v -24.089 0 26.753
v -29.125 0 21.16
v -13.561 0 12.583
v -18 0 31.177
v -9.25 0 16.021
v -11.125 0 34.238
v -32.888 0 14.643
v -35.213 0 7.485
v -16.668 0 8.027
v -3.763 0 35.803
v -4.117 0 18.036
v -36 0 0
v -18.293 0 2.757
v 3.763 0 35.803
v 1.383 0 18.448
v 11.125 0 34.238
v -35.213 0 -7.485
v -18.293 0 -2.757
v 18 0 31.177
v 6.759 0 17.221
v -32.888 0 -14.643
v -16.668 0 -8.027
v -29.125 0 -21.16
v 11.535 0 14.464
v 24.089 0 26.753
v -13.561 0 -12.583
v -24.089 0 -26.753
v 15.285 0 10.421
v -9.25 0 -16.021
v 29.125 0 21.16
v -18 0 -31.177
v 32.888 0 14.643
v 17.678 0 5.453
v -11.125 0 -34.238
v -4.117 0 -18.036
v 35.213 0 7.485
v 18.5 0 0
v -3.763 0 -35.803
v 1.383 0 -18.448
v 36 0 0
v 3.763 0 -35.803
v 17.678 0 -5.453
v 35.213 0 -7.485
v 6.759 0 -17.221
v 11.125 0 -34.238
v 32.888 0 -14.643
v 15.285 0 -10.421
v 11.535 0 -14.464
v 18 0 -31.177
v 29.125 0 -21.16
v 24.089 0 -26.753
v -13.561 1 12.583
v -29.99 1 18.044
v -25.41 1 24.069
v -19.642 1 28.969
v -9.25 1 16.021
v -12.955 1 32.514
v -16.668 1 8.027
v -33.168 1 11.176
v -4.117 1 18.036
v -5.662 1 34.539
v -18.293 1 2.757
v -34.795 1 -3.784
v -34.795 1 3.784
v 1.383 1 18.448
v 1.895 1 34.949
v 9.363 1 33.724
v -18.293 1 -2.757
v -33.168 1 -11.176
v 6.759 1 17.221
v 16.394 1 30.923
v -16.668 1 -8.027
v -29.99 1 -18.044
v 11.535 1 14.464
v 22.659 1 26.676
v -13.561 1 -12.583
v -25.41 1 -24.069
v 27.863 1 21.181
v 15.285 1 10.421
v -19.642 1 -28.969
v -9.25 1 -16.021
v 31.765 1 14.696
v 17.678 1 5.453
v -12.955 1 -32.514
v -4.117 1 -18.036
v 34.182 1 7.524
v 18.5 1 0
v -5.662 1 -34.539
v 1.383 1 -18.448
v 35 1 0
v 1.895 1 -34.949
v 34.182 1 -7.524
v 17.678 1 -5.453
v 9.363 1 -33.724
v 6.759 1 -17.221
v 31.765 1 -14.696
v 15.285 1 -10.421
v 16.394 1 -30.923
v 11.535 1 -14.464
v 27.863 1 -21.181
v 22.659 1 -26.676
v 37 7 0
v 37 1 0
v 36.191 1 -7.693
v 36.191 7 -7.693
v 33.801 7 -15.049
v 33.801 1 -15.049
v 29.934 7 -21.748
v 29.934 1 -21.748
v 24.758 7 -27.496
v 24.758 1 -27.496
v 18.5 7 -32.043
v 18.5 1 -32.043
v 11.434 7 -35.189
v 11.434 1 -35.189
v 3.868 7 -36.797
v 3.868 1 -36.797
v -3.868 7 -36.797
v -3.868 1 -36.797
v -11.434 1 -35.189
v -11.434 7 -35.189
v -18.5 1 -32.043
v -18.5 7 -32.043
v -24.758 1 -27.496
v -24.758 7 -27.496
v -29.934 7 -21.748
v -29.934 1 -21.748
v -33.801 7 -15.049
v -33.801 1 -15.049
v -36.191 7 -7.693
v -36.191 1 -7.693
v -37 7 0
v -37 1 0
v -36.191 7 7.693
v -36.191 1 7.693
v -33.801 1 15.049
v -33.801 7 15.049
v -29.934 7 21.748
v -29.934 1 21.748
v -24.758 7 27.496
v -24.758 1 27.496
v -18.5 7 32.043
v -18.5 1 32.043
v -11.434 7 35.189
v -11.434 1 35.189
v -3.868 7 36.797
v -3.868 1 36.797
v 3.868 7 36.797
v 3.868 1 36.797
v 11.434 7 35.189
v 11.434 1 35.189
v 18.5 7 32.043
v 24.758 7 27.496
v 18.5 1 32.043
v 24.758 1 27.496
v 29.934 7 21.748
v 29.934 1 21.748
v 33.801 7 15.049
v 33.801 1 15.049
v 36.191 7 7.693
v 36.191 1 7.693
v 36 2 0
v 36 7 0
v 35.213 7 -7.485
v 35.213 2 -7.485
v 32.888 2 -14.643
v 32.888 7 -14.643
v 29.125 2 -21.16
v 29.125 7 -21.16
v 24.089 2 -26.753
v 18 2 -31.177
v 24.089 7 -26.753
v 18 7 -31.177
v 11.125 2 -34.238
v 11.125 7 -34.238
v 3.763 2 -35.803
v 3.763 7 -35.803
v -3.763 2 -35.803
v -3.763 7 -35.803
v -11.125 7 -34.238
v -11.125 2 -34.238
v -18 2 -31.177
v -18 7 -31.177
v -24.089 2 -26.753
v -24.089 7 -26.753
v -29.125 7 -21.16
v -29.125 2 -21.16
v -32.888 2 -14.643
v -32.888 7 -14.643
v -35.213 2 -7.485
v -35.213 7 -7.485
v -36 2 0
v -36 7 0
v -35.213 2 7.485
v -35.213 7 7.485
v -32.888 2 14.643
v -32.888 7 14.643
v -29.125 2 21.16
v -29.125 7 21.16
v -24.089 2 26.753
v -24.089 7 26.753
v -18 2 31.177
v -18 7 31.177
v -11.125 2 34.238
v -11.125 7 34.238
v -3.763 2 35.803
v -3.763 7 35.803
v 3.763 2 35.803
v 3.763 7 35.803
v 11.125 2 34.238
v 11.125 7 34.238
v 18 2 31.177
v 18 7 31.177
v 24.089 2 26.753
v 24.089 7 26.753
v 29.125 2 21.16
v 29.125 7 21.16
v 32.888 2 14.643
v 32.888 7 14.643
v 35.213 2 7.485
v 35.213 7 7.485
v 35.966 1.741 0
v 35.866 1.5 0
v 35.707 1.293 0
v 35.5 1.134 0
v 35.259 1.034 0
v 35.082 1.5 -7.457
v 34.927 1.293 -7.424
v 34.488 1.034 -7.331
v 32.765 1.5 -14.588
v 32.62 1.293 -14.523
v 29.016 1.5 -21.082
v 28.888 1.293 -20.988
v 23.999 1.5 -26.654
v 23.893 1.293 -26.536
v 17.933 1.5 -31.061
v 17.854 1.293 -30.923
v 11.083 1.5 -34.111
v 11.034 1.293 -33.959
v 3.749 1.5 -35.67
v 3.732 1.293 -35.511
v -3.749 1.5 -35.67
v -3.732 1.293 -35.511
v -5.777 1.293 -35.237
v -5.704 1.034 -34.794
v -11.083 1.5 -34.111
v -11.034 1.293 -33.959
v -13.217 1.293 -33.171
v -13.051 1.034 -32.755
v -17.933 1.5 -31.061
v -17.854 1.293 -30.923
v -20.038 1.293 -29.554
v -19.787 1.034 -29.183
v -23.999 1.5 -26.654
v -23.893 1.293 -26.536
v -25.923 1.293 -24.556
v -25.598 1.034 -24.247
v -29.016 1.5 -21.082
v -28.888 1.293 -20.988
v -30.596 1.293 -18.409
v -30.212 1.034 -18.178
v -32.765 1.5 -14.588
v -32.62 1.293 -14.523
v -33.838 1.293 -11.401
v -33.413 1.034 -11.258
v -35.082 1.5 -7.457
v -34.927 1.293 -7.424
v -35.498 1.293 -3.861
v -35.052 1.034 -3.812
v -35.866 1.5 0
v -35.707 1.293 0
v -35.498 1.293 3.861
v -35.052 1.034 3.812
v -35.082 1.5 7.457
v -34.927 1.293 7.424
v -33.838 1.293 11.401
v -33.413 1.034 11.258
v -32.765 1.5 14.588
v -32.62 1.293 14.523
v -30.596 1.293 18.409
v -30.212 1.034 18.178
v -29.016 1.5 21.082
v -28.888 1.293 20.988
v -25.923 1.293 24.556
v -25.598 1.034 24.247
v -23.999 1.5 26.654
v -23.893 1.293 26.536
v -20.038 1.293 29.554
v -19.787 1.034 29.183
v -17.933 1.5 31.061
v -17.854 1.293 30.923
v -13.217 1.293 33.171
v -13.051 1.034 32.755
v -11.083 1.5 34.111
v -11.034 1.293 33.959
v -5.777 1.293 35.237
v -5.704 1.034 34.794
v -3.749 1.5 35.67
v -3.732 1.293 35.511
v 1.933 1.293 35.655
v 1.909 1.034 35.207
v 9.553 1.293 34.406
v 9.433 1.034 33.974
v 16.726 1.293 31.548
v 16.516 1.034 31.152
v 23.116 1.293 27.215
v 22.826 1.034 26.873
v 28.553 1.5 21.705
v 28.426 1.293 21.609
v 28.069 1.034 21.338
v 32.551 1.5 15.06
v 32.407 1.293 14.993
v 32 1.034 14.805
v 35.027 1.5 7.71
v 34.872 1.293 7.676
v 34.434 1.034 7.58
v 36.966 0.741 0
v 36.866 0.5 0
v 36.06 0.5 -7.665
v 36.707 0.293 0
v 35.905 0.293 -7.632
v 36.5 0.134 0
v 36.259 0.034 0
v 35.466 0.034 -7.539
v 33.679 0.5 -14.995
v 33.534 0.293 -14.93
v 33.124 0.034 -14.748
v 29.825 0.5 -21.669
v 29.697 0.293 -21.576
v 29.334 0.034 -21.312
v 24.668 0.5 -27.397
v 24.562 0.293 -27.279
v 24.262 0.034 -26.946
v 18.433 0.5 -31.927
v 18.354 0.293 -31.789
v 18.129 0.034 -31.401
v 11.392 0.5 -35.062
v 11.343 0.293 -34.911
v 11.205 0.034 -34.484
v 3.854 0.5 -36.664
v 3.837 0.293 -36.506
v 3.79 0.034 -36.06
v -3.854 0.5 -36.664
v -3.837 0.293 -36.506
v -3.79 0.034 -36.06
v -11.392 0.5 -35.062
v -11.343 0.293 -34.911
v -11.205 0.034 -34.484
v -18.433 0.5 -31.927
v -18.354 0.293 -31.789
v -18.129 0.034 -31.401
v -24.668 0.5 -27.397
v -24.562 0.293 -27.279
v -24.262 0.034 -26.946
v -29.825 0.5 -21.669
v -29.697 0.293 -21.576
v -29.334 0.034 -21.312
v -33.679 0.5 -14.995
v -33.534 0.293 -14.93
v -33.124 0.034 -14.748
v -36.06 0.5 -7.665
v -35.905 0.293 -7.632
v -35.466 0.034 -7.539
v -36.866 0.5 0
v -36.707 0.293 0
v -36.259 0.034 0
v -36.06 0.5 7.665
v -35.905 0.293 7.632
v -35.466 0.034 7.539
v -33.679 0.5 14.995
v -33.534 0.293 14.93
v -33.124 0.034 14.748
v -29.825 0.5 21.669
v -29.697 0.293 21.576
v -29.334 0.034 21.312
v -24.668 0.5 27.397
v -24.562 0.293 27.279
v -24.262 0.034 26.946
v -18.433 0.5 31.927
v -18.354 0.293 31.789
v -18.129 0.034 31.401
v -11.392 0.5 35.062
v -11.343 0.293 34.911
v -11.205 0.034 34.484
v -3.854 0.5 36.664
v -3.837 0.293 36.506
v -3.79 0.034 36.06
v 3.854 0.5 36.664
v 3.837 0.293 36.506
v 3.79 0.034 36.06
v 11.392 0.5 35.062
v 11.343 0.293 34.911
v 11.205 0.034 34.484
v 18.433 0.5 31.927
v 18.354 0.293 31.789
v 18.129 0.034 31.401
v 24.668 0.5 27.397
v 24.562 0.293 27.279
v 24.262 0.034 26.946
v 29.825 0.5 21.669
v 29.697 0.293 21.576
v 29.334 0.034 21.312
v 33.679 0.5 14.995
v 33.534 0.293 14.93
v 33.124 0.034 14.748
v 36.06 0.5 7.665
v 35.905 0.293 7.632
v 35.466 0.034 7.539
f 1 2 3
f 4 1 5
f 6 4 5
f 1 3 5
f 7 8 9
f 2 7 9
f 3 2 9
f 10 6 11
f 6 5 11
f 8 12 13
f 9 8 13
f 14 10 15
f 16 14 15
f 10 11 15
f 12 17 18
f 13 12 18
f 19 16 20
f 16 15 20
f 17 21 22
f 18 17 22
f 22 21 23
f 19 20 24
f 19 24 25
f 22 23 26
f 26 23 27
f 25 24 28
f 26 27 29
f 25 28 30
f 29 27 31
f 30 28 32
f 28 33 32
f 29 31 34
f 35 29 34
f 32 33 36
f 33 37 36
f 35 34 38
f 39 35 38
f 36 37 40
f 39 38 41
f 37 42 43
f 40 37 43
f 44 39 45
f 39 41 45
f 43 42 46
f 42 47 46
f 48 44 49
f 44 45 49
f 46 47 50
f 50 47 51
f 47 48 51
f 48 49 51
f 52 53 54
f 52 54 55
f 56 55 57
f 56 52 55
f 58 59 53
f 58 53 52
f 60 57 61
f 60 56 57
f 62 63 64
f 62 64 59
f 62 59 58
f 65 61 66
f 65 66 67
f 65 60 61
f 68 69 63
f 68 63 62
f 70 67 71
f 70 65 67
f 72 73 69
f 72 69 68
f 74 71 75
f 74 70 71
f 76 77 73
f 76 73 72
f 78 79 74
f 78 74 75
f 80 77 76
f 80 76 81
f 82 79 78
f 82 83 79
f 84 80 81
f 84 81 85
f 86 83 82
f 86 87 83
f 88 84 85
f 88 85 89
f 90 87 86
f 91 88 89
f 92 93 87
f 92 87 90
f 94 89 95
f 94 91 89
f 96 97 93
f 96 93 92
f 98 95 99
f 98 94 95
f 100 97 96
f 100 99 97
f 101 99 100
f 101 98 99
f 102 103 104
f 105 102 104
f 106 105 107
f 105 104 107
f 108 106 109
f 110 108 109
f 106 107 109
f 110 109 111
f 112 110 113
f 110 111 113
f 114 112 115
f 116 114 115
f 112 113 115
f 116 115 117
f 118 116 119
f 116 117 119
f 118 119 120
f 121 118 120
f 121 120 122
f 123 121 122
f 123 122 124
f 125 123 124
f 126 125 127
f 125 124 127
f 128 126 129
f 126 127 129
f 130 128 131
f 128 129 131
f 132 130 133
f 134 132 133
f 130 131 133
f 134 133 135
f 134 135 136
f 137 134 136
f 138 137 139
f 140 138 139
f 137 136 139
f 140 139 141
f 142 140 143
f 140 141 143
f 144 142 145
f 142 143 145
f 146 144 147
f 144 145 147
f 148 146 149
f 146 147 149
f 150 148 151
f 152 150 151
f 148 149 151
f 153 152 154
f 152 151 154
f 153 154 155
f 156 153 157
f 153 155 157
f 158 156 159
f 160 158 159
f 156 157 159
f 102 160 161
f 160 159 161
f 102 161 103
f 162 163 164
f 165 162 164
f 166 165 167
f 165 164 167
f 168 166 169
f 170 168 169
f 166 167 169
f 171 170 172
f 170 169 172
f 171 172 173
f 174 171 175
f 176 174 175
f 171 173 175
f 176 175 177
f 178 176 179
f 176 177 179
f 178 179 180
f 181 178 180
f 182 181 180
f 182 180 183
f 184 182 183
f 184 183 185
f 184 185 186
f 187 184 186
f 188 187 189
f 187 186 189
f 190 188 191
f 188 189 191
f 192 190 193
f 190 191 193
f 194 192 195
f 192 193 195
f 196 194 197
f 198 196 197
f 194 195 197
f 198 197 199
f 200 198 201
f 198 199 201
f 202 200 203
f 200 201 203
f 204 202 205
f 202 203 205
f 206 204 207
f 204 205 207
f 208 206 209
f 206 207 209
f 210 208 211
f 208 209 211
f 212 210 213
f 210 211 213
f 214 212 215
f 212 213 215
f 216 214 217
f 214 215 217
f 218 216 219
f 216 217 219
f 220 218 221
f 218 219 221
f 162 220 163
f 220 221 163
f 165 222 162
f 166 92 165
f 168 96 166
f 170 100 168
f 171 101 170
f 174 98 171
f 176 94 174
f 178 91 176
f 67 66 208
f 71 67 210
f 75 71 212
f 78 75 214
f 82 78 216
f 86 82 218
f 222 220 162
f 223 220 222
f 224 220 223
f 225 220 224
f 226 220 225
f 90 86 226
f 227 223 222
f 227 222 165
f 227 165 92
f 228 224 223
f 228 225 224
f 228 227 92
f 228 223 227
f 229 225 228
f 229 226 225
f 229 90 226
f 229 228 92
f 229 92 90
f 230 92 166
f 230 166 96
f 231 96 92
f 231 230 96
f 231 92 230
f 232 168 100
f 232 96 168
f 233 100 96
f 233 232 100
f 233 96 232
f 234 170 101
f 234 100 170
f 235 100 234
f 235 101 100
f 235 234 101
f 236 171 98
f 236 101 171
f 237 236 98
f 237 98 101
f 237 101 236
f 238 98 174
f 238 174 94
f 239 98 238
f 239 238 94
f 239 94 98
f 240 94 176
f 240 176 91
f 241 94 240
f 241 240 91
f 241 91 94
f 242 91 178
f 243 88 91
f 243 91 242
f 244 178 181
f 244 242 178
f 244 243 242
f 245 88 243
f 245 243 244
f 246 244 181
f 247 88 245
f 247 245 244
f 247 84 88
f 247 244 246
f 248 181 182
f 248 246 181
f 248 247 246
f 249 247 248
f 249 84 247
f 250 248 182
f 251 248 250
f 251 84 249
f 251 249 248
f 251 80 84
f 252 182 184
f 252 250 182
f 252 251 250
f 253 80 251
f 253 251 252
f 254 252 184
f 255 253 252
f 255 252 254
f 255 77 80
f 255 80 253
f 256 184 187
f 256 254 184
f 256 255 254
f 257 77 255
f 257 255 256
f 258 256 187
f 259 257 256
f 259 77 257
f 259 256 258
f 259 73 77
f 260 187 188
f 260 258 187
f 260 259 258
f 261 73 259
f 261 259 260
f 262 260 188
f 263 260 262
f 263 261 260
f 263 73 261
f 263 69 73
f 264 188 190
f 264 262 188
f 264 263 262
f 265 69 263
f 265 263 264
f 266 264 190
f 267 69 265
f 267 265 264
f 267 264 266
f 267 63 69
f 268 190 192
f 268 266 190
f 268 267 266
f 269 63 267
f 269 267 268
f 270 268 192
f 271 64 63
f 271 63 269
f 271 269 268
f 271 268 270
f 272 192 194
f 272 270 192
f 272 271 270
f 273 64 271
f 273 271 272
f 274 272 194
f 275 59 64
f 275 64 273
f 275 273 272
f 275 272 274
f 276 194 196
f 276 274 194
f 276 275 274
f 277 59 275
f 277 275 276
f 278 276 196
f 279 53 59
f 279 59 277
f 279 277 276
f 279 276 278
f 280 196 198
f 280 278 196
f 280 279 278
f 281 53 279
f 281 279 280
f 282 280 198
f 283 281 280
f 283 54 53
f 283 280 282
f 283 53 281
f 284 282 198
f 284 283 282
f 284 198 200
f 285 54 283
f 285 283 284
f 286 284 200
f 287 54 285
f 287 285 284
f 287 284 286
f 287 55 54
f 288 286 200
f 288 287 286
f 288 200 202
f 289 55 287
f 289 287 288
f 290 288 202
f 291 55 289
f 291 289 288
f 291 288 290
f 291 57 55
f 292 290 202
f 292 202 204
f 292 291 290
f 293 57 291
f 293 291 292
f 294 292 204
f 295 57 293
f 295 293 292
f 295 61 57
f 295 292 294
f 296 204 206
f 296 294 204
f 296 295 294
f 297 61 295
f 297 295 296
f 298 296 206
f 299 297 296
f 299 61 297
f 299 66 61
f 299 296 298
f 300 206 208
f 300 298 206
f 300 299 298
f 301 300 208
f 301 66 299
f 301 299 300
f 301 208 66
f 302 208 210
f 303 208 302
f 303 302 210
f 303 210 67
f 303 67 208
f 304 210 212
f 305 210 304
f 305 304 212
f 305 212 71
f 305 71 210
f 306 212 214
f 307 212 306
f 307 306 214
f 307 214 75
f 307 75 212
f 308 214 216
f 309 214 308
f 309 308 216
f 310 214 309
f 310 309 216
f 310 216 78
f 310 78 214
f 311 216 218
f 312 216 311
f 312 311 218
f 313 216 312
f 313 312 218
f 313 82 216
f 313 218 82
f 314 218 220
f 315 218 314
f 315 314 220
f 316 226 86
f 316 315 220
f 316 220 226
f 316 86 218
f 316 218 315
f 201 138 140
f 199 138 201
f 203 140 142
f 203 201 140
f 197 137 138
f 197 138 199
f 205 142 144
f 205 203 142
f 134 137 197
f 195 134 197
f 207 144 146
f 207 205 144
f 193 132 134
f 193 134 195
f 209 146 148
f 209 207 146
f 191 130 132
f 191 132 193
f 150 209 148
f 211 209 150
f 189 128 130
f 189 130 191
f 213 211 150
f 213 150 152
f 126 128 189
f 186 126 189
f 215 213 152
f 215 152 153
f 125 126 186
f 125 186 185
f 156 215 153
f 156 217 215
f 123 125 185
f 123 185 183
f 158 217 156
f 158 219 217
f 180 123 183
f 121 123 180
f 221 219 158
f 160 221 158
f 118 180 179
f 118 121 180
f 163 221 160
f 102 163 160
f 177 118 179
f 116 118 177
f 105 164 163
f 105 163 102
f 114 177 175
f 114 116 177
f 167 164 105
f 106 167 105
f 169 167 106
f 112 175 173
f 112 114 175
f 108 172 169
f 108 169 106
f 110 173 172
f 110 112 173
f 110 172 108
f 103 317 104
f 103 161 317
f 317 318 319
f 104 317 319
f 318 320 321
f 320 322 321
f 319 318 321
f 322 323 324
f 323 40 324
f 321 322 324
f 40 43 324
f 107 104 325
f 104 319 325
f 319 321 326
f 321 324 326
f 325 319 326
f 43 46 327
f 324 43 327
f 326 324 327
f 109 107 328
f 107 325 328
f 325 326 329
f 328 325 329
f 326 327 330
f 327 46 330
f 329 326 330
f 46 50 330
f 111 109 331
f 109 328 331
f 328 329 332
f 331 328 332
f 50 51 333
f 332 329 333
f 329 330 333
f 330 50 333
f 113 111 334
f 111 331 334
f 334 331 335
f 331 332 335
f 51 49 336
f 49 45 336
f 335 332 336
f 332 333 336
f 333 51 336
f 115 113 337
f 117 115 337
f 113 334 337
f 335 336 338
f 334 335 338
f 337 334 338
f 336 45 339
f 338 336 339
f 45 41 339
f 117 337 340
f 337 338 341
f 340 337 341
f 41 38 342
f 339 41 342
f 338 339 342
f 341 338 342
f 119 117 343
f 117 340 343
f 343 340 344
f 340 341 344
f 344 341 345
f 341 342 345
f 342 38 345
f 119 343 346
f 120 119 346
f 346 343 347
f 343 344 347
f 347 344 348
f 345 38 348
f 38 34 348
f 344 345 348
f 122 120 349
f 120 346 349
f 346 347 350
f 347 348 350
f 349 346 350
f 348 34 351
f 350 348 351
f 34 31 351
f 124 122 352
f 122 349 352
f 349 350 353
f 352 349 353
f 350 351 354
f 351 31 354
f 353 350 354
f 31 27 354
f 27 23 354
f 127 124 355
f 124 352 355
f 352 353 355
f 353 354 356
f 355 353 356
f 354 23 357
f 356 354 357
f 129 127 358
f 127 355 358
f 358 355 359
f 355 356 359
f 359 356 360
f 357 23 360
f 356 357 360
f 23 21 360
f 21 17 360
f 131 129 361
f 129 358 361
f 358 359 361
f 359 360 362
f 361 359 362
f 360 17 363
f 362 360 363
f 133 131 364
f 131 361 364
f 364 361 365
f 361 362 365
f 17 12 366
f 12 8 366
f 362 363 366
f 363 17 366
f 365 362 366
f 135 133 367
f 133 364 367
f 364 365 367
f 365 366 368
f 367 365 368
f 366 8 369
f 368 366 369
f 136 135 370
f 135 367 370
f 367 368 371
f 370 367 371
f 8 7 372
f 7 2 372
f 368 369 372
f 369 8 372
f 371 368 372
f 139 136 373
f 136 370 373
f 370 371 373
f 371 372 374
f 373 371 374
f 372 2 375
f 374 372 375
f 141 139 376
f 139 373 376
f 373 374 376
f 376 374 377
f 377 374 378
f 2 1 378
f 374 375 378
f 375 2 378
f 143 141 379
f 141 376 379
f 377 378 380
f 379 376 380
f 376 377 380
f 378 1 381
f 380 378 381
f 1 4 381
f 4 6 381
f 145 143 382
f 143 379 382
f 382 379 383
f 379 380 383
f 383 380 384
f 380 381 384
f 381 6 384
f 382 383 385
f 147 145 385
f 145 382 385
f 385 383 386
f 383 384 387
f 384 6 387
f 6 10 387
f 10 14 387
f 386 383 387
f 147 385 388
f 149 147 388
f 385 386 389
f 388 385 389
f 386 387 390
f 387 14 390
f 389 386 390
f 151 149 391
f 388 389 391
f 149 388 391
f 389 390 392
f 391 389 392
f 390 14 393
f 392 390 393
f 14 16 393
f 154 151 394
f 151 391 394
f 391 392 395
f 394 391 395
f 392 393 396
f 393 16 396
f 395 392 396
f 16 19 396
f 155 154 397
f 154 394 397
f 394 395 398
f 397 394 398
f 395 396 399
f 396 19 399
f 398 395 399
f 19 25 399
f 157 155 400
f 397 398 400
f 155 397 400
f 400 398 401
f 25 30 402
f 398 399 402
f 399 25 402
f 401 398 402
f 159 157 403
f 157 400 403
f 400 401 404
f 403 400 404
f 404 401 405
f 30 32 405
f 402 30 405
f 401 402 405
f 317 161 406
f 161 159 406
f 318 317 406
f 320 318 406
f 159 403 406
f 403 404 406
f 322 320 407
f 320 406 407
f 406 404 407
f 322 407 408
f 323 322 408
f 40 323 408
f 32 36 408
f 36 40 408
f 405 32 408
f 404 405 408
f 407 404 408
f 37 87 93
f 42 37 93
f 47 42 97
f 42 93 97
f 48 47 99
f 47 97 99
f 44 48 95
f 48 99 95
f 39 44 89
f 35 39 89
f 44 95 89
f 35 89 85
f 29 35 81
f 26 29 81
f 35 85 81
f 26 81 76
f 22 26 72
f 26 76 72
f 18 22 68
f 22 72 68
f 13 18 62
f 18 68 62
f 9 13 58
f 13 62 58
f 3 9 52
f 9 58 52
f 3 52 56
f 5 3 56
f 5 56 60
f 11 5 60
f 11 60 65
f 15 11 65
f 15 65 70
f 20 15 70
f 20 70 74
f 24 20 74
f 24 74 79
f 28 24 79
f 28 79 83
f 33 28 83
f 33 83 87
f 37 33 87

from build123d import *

# Parameters (mm, degrees)
SKETCH1_R           = 37
BOSS_EXTRUDE1_DEPTH = 7
SKETCH2_R           = 36
CUT_EXTRUDE1_DEPTH  = 6
SKETCH3_R           = 18.5
CUT_EXTRUDE2_DEPTH  = 6
FILLET1_R           = 1


with BuildPart() as part:
    # Sketch1 → Boss-Extrude1 (new body)
    with BuildSketch(Plane(origin=(0, 0, 0), x_dir=(1, 0, 0), z_dir=(0, 1, 0))):
        Circle(SKETCH1_R)
    extrude(amount=BOSS_EXTRUDE1_DEPTH)

    # Sketch2 → Cut-Extrude1 (cut)
    with BuildSketch(Plane(origin=(0, 7, 0), x_dir=(1, 0, 0), z_dir=(0, 1, 0))):
        Circle(SKETCH2_R)
    extrude(amount=-CUT_EXTRUDE1_DEPTH, mode=Mode.SUBTRACT)

    # Sketch3 → Cut-Extrude2 (cut)
    with BuildSketch(Plane(origin=(0, 1, 0), x_dir=(1, 0, 0), z_dir=(0, 1, 0))):
        Circle(SKETCH3_R)
    extrude(amount=-CUT_EXTRUDE2_DEPTH, mode=Mode.SUBTRACT)

    # Fillet1
    fillet1_edges = [part.edges().sort_by_distance(p)[0] for p in [
        (-37, 0, 0),
        (-36, 1, 0),
    ]]
    fillet(fillet1_edges, radius=FILLET1_R)


solid = part.part
